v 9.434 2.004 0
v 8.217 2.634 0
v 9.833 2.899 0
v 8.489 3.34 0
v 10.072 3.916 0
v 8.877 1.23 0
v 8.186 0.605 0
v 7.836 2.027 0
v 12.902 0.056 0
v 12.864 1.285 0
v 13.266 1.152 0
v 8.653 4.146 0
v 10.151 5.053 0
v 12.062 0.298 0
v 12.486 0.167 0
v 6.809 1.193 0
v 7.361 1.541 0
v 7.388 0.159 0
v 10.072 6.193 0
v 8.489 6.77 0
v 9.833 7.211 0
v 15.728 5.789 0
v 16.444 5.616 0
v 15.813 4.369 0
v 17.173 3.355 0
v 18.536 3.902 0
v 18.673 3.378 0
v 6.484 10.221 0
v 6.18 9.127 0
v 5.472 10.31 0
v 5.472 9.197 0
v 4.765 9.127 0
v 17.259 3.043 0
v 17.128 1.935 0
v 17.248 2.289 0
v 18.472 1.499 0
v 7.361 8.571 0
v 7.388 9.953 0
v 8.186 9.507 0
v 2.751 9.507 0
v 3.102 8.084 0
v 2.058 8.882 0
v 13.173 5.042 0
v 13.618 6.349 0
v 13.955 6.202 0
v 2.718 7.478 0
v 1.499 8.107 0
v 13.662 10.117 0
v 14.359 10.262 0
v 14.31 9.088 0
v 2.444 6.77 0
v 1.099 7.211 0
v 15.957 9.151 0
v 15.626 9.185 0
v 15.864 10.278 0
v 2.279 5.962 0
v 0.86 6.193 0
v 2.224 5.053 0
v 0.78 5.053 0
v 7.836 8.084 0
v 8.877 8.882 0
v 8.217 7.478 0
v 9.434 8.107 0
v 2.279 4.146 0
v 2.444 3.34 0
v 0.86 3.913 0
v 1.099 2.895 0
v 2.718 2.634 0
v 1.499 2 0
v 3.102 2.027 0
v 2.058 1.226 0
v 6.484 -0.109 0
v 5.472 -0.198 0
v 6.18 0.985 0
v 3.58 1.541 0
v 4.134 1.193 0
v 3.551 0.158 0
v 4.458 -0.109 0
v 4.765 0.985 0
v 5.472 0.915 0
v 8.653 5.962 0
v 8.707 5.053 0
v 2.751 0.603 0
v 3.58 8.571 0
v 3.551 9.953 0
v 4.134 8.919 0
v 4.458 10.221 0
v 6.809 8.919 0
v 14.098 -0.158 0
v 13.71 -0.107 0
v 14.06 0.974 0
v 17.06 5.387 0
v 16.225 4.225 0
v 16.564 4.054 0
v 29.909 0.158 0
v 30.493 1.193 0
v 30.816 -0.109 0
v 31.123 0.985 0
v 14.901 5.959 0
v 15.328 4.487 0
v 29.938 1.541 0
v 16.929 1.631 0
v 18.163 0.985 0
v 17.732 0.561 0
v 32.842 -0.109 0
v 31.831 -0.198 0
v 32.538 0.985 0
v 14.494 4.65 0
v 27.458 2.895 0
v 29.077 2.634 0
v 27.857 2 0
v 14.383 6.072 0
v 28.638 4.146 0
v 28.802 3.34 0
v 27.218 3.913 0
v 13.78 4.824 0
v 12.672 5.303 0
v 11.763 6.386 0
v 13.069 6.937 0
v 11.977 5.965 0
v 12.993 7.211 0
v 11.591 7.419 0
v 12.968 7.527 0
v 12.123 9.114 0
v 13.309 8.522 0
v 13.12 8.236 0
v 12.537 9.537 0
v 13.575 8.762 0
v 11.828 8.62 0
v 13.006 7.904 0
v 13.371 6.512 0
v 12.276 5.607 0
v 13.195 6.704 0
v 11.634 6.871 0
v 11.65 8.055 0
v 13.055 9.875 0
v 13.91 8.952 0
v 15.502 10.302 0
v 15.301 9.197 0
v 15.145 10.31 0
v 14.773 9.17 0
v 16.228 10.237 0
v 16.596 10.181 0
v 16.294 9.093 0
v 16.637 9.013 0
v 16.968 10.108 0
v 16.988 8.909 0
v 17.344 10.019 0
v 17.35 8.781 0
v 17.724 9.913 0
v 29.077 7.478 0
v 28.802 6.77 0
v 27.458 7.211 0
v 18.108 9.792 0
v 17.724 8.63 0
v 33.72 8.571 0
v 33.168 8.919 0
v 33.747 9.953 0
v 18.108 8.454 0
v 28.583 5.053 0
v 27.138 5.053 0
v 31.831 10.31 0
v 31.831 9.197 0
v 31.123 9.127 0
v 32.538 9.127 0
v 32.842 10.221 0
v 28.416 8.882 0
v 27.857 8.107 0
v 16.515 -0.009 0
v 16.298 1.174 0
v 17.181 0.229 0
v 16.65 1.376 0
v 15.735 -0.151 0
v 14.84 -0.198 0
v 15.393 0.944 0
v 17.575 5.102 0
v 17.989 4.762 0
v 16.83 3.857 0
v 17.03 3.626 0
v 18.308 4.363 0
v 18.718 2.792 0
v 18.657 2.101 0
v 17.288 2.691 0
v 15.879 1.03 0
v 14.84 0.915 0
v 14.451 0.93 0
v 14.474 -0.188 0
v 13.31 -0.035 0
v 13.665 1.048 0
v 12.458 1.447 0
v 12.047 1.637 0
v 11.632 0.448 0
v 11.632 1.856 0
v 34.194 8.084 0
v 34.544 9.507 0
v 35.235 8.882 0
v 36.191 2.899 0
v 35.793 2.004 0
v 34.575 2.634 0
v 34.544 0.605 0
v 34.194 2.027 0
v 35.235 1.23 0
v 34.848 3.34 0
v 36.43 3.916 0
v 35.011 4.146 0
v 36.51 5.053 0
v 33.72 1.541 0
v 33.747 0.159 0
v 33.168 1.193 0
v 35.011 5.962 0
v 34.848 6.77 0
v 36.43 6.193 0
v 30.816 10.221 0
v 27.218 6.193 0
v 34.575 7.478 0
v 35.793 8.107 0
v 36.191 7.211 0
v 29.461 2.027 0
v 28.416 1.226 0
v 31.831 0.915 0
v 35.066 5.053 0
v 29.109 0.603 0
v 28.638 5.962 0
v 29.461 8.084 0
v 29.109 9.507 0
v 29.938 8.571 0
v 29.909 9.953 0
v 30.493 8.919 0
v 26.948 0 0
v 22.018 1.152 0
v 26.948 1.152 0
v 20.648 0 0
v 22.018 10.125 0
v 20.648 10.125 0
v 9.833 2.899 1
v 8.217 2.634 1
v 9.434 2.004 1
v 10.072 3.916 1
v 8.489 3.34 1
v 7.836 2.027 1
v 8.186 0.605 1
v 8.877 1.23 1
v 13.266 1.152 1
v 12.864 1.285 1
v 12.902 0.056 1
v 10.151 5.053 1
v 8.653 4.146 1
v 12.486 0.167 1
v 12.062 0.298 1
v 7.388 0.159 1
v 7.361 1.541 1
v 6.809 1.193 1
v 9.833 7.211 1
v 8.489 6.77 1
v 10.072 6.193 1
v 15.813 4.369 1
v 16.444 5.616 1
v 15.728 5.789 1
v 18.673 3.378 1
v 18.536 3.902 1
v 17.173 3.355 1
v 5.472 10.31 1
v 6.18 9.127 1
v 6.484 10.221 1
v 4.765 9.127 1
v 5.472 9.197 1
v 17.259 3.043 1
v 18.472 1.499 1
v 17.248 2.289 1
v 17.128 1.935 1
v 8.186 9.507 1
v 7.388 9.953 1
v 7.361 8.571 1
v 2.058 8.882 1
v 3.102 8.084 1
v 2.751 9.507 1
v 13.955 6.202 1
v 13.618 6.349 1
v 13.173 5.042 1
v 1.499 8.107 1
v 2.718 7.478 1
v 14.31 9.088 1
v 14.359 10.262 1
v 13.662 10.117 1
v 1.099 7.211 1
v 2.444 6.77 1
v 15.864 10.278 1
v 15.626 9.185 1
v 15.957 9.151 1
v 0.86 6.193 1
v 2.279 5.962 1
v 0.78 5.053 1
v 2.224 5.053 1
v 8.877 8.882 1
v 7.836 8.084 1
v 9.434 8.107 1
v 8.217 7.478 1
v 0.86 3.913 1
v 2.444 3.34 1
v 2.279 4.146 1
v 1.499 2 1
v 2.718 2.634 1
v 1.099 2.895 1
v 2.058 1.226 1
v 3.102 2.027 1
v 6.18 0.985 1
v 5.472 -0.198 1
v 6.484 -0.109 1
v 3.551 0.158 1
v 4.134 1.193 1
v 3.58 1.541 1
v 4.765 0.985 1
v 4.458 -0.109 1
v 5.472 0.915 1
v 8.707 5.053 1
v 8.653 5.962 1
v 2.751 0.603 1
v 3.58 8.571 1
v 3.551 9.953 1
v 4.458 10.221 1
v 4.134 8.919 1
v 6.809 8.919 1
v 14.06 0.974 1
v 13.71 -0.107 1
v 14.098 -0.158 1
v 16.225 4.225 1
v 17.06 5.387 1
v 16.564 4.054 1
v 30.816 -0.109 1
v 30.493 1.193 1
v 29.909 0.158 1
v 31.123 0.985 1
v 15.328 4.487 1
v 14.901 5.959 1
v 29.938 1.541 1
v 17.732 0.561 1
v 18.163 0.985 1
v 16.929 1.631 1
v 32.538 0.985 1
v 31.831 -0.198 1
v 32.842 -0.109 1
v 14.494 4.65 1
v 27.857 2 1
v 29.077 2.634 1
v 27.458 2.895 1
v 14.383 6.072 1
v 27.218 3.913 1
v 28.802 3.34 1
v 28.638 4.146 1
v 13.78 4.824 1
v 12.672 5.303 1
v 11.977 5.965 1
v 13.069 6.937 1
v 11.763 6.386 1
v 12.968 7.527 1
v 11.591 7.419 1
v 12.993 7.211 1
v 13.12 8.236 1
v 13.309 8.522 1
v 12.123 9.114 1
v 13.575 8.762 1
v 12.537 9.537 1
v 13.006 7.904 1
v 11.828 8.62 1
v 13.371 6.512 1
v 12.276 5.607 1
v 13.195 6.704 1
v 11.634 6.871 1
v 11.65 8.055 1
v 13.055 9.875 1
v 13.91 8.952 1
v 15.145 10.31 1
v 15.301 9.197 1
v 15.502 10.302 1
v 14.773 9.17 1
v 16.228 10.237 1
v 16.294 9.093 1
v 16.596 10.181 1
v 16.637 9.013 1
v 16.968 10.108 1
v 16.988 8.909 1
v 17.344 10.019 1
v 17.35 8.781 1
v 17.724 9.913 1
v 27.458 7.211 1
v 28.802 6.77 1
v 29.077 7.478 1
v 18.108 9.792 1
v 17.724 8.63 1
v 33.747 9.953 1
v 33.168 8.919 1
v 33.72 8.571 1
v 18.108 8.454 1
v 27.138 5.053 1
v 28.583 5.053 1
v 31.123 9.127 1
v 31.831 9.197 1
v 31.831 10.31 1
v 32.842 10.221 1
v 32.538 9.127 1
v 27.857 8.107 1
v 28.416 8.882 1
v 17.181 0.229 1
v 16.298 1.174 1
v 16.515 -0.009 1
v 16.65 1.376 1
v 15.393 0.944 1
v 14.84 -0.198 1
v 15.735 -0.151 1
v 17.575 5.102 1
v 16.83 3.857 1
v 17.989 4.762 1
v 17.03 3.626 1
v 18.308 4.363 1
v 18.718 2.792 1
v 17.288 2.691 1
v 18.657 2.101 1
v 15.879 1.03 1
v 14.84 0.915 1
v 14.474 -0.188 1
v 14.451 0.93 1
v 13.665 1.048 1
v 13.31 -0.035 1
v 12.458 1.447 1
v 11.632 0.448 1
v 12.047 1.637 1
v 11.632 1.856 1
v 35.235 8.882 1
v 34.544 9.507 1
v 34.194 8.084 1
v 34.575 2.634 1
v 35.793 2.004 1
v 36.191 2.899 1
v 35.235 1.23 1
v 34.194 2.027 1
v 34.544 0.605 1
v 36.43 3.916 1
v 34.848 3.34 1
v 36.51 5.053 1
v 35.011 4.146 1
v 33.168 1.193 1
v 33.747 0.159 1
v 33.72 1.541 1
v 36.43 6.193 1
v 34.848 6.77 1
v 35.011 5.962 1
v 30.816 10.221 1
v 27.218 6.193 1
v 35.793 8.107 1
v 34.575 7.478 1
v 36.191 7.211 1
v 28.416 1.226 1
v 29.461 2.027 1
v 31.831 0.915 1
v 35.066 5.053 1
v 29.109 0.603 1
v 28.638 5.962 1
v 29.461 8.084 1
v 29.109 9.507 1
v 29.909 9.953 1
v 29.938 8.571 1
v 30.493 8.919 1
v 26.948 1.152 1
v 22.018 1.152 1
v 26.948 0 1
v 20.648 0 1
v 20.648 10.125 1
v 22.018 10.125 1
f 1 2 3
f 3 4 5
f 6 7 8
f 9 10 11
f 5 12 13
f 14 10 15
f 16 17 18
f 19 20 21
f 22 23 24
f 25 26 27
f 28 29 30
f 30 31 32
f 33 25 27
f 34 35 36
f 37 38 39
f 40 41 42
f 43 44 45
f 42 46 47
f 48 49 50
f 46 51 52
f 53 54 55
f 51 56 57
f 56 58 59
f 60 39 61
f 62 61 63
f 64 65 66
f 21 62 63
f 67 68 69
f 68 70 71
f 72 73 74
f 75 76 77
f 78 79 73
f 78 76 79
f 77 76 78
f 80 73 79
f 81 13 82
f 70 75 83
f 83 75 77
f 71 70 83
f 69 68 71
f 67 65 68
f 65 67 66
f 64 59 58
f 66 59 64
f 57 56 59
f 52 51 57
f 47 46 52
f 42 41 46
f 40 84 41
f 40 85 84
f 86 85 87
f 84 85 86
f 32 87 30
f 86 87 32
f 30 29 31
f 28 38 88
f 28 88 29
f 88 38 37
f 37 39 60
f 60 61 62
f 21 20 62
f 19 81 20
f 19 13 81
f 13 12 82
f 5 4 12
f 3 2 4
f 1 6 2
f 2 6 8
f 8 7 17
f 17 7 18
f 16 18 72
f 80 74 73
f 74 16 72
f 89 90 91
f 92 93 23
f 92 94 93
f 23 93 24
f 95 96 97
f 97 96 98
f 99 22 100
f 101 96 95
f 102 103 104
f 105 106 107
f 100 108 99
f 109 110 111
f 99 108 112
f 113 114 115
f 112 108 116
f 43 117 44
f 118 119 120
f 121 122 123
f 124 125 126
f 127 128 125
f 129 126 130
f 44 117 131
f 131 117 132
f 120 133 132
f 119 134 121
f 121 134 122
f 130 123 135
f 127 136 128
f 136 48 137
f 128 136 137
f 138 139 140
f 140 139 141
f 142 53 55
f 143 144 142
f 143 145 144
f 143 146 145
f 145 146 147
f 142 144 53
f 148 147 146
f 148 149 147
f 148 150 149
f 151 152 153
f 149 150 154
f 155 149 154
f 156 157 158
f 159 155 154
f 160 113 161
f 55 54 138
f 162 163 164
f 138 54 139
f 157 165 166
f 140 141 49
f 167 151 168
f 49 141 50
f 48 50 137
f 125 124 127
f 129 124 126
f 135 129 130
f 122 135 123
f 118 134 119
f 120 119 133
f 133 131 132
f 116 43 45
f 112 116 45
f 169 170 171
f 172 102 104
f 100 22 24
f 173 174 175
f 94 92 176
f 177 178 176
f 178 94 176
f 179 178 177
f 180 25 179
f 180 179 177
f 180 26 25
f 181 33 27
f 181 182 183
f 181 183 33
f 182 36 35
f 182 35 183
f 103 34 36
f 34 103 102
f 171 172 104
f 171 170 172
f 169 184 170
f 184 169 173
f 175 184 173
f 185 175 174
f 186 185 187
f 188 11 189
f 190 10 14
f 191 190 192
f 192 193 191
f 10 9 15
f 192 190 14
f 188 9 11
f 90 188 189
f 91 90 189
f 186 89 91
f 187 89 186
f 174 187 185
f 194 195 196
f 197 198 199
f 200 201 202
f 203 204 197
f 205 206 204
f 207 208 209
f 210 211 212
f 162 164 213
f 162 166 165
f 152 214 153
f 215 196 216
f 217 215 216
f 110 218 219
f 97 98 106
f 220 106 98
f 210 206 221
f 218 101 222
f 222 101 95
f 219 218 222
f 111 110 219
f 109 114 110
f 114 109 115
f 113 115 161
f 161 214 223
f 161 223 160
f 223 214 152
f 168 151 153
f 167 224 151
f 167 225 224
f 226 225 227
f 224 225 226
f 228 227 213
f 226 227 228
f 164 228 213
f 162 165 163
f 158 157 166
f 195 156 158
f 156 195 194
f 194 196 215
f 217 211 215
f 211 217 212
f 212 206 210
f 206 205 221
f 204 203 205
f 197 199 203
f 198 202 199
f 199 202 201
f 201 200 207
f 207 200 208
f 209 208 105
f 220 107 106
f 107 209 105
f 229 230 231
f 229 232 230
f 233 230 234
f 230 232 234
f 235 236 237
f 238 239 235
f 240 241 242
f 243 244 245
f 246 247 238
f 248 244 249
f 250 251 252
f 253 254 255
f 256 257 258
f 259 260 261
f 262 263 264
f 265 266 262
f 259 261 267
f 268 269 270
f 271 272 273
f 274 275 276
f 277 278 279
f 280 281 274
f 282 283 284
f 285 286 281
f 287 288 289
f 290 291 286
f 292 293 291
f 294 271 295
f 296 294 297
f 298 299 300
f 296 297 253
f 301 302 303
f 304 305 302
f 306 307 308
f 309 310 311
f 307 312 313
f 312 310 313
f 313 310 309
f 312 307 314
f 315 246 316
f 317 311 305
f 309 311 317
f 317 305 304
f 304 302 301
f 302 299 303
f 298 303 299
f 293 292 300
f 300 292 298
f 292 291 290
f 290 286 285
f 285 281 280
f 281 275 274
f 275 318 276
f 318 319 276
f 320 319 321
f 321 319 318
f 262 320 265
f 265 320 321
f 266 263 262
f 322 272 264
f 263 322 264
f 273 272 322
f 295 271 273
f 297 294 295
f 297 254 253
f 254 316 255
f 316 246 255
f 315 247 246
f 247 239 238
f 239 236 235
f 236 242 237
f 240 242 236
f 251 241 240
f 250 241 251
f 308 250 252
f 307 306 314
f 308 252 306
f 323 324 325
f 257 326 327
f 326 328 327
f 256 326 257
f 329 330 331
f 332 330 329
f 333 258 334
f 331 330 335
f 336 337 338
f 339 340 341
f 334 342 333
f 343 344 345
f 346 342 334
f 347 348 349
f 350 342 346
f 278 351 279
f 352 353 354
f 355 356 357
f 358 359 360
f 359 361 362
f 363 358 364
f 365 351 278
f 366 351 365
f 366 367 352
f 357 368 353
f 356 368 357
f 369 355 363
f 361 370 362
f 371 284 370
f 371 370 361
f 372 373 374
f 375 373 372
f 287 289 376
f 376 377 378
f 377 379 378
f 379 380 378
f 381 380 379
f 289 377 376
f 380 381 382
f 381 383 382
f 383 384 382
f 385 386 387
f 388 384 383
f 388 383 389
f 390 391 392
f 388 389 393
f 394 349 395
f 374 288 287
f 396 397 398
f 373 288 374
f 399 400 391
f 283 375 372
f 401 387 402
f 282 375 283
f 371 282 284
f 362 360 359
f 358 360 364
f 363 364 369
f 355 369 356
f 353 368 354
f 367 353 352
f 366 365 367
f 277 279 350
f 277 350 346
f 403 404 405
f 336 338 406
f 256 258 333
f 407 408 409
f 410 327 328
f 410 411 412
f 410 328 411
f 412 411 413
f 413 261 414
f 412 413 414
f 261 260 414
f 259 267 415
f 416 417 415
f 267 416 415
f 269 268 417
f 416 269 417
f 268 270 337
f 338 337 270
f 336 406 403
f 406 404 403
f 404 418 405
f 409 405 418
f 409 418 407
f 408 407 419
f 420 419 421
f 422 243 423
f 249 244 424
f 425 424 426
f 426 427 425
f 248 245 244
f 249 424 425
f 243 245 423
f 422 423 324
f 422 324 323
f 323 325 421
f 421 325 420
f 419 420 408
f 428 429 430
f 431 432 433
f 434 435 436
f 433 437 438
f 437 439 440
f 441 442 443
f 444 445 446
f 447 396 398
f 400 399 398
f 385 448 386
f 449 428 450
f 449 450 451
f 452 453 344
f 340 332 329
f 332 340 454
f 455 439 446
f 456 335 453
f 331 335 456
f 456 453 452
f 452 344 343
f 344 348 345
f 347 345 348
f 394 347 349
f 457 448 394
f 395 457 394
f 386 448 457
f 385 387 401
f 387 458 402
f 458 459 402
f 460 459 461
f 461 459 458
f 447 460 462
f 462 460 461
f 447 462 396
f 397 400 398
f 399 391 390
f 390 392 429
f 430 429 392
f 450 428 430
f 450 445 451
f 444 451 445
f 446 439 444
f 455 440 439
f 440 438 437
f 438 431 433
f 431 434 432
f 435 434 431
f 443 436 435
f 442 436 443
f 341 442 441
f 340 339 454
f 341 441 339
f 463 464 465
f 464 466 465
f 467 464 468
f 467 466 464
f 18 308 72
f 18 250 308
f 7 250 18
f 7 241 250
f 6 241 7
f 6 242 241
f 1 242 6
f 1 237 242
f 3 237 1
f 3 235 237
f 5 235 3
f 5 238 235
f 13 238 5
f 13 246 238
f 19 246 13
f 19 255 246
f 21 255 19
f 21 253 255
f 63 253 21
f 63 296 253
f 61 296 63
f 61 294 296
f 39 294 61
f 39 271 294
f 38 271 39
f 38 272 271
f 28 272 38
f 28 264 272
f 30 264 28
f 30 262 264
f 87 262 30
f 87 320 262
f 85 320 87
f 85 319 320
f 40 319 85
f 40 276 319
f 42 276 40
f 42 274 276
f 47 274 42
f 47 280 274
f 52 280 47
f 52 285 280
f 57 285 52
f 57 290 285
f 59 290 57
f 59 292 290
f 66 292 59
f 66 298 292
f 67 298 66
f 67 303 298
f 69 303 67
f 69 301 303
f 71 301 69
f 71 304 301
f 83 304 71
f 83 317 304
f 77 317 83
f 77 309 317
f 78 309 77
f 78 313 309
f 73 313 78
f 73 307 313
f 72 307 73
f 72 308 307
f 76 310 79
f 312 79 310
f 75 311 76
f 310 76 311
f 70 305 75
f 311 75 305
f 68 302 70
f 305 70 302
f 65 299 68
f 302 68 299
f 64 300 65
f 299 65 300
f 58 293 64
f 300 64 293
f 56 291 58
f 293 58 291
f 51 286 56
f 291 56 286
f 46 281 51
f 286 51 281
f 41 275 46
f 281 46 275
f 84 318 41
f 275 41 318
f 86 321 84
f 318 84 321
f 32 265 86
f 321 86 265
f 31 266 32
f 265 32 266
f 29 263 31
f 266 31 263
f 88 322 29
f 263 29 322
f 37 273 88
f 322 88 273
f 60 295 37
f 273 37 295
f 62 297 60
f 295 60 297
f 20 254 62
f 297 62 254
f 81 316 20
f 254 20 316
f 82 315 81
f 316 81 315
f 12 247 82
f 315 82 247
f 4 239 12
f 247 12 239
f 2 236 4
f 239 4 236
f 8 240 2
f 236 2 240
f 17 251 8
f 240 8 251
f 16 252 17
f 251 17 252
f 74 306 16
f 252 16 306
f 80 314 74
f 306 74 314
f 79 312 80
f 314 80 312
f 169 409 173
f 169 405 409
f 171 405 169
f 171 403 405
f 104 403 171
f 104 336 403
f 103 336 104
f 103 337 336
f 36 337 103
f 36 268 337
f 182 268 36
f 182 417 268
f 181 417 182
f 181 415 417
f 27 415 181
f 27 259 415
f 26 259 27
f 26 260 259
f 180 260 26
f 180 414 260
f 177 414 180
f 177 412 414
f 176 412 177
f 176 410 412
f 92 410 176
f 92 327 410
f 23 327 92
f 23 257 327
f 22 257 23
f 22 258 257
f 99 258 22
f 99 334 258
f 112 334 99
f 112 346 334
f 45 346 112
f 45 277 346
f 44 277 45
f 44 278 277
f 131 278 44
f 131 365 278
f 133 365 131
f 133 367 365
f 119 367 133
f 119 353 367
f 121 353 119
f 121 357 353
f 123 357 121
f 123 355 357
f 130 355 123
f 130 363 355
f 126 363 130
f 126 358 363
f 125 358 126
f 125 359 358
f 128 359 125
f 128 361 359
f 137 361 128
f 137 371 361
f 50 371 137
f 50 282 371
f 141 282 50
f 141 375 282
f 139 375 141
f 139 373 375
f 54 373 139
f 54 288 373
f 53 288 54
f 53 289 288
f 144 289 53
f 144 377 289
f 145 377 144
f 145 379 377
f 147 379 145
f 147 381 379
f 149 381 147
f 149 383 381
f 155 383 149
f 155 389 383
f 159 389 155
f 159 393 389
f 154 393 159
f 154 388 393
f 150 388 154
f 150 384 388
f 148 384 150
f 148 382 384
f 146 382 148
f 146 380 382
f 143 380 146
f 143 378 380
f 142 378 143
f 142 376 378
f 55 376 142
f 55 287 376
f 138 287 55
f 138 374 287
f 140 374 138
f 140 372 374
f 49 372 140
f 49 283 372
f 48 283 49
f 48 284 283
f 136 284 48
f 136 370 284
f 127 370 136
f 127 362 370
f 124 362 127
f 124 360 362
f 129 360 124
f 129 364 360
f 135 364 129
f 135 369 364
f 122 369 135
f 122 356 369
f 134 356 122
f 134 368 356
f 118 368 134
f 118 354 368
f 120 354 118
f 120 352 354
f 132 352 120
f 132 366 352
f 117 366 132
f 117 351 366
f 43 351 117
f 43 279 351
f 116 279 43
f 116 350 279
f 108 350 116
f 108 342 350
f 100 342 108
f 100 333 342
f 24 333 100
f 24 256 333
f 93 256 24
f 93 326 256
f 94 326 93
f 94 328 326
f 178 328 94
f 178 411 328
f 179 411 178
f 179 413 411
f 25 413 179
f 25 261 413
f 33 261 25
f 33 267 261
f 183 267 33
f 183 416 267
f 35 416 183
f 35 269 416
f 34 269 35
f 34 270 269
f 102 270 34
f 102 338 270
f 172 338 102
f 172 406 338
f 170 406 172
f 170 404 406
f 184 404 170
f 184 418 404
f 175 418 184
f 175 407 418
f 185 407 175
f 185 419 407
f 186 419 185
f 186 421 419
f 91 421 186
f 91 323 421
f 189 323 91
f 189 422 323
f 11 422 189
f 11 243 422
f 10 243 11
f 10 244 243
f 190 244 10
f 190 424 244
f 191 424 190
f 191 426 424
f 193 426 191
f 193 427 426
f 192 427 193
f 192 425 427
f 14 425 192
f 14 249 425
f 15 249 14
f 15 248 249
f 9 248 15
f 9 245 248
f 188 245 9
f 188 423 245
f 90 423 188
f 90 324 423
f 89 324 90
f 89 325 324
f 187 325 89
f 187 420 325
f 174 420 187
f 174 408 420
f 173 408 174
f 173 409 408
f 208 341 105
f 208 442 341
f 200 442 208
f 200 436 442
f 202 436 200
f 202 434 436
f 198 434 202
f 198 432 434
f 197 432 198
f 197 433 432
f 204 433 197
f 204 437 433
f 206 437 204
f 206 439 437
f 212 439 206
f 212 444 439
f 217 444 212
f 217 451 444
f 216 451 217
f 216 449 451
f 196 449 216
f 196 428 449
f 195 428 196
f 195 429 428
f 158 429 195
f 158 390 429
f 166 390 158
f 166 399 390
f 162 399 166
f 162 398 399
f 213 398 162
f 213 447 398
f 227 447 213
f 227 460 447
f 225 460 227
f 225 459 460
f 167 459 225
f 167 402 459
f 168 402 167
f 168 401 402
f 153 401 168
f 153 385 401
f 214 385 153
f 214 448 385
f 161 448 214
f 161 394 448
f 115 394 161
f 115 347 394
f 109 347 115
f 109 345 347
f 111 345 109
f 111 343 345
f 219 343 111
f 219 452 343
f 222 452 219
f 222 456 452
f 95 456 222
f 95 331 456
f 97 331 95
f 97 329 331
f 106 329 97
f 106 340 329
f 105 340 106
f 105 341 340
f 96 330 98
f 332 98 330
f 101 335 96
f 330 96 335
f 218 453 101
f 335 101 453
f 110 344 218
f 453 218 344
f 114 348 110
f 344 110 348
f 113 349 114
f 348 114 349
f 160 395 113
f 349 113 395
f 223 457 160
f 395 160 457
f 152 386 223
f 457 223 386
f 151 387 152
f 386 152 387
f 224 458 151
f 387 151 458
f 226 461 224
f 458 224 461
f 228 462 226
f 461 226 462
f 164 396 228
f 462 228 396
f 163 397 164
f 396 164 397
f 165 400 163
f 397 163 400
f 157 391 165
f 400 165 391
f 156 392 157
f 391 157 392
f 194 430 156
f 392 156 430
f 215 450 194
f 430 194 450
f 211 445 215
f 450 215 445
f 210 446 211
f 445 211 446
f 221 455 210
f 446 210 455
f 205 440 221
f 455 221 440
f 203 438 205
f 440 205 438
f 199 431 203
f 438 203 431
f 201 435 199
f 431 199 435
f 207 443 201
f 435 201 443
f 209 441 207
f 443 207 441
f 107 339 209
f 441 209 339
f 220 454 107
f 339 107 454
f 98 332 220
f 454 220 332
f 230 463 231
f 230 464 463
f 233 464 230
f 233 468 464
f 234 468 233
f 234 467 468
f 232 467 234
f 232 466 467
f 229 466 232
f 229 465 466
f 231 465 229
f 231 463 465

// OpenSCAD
font="Moderat";
s1="OSLO";
s2="MET";

linear_extrude(1) text(s1, font=font);
